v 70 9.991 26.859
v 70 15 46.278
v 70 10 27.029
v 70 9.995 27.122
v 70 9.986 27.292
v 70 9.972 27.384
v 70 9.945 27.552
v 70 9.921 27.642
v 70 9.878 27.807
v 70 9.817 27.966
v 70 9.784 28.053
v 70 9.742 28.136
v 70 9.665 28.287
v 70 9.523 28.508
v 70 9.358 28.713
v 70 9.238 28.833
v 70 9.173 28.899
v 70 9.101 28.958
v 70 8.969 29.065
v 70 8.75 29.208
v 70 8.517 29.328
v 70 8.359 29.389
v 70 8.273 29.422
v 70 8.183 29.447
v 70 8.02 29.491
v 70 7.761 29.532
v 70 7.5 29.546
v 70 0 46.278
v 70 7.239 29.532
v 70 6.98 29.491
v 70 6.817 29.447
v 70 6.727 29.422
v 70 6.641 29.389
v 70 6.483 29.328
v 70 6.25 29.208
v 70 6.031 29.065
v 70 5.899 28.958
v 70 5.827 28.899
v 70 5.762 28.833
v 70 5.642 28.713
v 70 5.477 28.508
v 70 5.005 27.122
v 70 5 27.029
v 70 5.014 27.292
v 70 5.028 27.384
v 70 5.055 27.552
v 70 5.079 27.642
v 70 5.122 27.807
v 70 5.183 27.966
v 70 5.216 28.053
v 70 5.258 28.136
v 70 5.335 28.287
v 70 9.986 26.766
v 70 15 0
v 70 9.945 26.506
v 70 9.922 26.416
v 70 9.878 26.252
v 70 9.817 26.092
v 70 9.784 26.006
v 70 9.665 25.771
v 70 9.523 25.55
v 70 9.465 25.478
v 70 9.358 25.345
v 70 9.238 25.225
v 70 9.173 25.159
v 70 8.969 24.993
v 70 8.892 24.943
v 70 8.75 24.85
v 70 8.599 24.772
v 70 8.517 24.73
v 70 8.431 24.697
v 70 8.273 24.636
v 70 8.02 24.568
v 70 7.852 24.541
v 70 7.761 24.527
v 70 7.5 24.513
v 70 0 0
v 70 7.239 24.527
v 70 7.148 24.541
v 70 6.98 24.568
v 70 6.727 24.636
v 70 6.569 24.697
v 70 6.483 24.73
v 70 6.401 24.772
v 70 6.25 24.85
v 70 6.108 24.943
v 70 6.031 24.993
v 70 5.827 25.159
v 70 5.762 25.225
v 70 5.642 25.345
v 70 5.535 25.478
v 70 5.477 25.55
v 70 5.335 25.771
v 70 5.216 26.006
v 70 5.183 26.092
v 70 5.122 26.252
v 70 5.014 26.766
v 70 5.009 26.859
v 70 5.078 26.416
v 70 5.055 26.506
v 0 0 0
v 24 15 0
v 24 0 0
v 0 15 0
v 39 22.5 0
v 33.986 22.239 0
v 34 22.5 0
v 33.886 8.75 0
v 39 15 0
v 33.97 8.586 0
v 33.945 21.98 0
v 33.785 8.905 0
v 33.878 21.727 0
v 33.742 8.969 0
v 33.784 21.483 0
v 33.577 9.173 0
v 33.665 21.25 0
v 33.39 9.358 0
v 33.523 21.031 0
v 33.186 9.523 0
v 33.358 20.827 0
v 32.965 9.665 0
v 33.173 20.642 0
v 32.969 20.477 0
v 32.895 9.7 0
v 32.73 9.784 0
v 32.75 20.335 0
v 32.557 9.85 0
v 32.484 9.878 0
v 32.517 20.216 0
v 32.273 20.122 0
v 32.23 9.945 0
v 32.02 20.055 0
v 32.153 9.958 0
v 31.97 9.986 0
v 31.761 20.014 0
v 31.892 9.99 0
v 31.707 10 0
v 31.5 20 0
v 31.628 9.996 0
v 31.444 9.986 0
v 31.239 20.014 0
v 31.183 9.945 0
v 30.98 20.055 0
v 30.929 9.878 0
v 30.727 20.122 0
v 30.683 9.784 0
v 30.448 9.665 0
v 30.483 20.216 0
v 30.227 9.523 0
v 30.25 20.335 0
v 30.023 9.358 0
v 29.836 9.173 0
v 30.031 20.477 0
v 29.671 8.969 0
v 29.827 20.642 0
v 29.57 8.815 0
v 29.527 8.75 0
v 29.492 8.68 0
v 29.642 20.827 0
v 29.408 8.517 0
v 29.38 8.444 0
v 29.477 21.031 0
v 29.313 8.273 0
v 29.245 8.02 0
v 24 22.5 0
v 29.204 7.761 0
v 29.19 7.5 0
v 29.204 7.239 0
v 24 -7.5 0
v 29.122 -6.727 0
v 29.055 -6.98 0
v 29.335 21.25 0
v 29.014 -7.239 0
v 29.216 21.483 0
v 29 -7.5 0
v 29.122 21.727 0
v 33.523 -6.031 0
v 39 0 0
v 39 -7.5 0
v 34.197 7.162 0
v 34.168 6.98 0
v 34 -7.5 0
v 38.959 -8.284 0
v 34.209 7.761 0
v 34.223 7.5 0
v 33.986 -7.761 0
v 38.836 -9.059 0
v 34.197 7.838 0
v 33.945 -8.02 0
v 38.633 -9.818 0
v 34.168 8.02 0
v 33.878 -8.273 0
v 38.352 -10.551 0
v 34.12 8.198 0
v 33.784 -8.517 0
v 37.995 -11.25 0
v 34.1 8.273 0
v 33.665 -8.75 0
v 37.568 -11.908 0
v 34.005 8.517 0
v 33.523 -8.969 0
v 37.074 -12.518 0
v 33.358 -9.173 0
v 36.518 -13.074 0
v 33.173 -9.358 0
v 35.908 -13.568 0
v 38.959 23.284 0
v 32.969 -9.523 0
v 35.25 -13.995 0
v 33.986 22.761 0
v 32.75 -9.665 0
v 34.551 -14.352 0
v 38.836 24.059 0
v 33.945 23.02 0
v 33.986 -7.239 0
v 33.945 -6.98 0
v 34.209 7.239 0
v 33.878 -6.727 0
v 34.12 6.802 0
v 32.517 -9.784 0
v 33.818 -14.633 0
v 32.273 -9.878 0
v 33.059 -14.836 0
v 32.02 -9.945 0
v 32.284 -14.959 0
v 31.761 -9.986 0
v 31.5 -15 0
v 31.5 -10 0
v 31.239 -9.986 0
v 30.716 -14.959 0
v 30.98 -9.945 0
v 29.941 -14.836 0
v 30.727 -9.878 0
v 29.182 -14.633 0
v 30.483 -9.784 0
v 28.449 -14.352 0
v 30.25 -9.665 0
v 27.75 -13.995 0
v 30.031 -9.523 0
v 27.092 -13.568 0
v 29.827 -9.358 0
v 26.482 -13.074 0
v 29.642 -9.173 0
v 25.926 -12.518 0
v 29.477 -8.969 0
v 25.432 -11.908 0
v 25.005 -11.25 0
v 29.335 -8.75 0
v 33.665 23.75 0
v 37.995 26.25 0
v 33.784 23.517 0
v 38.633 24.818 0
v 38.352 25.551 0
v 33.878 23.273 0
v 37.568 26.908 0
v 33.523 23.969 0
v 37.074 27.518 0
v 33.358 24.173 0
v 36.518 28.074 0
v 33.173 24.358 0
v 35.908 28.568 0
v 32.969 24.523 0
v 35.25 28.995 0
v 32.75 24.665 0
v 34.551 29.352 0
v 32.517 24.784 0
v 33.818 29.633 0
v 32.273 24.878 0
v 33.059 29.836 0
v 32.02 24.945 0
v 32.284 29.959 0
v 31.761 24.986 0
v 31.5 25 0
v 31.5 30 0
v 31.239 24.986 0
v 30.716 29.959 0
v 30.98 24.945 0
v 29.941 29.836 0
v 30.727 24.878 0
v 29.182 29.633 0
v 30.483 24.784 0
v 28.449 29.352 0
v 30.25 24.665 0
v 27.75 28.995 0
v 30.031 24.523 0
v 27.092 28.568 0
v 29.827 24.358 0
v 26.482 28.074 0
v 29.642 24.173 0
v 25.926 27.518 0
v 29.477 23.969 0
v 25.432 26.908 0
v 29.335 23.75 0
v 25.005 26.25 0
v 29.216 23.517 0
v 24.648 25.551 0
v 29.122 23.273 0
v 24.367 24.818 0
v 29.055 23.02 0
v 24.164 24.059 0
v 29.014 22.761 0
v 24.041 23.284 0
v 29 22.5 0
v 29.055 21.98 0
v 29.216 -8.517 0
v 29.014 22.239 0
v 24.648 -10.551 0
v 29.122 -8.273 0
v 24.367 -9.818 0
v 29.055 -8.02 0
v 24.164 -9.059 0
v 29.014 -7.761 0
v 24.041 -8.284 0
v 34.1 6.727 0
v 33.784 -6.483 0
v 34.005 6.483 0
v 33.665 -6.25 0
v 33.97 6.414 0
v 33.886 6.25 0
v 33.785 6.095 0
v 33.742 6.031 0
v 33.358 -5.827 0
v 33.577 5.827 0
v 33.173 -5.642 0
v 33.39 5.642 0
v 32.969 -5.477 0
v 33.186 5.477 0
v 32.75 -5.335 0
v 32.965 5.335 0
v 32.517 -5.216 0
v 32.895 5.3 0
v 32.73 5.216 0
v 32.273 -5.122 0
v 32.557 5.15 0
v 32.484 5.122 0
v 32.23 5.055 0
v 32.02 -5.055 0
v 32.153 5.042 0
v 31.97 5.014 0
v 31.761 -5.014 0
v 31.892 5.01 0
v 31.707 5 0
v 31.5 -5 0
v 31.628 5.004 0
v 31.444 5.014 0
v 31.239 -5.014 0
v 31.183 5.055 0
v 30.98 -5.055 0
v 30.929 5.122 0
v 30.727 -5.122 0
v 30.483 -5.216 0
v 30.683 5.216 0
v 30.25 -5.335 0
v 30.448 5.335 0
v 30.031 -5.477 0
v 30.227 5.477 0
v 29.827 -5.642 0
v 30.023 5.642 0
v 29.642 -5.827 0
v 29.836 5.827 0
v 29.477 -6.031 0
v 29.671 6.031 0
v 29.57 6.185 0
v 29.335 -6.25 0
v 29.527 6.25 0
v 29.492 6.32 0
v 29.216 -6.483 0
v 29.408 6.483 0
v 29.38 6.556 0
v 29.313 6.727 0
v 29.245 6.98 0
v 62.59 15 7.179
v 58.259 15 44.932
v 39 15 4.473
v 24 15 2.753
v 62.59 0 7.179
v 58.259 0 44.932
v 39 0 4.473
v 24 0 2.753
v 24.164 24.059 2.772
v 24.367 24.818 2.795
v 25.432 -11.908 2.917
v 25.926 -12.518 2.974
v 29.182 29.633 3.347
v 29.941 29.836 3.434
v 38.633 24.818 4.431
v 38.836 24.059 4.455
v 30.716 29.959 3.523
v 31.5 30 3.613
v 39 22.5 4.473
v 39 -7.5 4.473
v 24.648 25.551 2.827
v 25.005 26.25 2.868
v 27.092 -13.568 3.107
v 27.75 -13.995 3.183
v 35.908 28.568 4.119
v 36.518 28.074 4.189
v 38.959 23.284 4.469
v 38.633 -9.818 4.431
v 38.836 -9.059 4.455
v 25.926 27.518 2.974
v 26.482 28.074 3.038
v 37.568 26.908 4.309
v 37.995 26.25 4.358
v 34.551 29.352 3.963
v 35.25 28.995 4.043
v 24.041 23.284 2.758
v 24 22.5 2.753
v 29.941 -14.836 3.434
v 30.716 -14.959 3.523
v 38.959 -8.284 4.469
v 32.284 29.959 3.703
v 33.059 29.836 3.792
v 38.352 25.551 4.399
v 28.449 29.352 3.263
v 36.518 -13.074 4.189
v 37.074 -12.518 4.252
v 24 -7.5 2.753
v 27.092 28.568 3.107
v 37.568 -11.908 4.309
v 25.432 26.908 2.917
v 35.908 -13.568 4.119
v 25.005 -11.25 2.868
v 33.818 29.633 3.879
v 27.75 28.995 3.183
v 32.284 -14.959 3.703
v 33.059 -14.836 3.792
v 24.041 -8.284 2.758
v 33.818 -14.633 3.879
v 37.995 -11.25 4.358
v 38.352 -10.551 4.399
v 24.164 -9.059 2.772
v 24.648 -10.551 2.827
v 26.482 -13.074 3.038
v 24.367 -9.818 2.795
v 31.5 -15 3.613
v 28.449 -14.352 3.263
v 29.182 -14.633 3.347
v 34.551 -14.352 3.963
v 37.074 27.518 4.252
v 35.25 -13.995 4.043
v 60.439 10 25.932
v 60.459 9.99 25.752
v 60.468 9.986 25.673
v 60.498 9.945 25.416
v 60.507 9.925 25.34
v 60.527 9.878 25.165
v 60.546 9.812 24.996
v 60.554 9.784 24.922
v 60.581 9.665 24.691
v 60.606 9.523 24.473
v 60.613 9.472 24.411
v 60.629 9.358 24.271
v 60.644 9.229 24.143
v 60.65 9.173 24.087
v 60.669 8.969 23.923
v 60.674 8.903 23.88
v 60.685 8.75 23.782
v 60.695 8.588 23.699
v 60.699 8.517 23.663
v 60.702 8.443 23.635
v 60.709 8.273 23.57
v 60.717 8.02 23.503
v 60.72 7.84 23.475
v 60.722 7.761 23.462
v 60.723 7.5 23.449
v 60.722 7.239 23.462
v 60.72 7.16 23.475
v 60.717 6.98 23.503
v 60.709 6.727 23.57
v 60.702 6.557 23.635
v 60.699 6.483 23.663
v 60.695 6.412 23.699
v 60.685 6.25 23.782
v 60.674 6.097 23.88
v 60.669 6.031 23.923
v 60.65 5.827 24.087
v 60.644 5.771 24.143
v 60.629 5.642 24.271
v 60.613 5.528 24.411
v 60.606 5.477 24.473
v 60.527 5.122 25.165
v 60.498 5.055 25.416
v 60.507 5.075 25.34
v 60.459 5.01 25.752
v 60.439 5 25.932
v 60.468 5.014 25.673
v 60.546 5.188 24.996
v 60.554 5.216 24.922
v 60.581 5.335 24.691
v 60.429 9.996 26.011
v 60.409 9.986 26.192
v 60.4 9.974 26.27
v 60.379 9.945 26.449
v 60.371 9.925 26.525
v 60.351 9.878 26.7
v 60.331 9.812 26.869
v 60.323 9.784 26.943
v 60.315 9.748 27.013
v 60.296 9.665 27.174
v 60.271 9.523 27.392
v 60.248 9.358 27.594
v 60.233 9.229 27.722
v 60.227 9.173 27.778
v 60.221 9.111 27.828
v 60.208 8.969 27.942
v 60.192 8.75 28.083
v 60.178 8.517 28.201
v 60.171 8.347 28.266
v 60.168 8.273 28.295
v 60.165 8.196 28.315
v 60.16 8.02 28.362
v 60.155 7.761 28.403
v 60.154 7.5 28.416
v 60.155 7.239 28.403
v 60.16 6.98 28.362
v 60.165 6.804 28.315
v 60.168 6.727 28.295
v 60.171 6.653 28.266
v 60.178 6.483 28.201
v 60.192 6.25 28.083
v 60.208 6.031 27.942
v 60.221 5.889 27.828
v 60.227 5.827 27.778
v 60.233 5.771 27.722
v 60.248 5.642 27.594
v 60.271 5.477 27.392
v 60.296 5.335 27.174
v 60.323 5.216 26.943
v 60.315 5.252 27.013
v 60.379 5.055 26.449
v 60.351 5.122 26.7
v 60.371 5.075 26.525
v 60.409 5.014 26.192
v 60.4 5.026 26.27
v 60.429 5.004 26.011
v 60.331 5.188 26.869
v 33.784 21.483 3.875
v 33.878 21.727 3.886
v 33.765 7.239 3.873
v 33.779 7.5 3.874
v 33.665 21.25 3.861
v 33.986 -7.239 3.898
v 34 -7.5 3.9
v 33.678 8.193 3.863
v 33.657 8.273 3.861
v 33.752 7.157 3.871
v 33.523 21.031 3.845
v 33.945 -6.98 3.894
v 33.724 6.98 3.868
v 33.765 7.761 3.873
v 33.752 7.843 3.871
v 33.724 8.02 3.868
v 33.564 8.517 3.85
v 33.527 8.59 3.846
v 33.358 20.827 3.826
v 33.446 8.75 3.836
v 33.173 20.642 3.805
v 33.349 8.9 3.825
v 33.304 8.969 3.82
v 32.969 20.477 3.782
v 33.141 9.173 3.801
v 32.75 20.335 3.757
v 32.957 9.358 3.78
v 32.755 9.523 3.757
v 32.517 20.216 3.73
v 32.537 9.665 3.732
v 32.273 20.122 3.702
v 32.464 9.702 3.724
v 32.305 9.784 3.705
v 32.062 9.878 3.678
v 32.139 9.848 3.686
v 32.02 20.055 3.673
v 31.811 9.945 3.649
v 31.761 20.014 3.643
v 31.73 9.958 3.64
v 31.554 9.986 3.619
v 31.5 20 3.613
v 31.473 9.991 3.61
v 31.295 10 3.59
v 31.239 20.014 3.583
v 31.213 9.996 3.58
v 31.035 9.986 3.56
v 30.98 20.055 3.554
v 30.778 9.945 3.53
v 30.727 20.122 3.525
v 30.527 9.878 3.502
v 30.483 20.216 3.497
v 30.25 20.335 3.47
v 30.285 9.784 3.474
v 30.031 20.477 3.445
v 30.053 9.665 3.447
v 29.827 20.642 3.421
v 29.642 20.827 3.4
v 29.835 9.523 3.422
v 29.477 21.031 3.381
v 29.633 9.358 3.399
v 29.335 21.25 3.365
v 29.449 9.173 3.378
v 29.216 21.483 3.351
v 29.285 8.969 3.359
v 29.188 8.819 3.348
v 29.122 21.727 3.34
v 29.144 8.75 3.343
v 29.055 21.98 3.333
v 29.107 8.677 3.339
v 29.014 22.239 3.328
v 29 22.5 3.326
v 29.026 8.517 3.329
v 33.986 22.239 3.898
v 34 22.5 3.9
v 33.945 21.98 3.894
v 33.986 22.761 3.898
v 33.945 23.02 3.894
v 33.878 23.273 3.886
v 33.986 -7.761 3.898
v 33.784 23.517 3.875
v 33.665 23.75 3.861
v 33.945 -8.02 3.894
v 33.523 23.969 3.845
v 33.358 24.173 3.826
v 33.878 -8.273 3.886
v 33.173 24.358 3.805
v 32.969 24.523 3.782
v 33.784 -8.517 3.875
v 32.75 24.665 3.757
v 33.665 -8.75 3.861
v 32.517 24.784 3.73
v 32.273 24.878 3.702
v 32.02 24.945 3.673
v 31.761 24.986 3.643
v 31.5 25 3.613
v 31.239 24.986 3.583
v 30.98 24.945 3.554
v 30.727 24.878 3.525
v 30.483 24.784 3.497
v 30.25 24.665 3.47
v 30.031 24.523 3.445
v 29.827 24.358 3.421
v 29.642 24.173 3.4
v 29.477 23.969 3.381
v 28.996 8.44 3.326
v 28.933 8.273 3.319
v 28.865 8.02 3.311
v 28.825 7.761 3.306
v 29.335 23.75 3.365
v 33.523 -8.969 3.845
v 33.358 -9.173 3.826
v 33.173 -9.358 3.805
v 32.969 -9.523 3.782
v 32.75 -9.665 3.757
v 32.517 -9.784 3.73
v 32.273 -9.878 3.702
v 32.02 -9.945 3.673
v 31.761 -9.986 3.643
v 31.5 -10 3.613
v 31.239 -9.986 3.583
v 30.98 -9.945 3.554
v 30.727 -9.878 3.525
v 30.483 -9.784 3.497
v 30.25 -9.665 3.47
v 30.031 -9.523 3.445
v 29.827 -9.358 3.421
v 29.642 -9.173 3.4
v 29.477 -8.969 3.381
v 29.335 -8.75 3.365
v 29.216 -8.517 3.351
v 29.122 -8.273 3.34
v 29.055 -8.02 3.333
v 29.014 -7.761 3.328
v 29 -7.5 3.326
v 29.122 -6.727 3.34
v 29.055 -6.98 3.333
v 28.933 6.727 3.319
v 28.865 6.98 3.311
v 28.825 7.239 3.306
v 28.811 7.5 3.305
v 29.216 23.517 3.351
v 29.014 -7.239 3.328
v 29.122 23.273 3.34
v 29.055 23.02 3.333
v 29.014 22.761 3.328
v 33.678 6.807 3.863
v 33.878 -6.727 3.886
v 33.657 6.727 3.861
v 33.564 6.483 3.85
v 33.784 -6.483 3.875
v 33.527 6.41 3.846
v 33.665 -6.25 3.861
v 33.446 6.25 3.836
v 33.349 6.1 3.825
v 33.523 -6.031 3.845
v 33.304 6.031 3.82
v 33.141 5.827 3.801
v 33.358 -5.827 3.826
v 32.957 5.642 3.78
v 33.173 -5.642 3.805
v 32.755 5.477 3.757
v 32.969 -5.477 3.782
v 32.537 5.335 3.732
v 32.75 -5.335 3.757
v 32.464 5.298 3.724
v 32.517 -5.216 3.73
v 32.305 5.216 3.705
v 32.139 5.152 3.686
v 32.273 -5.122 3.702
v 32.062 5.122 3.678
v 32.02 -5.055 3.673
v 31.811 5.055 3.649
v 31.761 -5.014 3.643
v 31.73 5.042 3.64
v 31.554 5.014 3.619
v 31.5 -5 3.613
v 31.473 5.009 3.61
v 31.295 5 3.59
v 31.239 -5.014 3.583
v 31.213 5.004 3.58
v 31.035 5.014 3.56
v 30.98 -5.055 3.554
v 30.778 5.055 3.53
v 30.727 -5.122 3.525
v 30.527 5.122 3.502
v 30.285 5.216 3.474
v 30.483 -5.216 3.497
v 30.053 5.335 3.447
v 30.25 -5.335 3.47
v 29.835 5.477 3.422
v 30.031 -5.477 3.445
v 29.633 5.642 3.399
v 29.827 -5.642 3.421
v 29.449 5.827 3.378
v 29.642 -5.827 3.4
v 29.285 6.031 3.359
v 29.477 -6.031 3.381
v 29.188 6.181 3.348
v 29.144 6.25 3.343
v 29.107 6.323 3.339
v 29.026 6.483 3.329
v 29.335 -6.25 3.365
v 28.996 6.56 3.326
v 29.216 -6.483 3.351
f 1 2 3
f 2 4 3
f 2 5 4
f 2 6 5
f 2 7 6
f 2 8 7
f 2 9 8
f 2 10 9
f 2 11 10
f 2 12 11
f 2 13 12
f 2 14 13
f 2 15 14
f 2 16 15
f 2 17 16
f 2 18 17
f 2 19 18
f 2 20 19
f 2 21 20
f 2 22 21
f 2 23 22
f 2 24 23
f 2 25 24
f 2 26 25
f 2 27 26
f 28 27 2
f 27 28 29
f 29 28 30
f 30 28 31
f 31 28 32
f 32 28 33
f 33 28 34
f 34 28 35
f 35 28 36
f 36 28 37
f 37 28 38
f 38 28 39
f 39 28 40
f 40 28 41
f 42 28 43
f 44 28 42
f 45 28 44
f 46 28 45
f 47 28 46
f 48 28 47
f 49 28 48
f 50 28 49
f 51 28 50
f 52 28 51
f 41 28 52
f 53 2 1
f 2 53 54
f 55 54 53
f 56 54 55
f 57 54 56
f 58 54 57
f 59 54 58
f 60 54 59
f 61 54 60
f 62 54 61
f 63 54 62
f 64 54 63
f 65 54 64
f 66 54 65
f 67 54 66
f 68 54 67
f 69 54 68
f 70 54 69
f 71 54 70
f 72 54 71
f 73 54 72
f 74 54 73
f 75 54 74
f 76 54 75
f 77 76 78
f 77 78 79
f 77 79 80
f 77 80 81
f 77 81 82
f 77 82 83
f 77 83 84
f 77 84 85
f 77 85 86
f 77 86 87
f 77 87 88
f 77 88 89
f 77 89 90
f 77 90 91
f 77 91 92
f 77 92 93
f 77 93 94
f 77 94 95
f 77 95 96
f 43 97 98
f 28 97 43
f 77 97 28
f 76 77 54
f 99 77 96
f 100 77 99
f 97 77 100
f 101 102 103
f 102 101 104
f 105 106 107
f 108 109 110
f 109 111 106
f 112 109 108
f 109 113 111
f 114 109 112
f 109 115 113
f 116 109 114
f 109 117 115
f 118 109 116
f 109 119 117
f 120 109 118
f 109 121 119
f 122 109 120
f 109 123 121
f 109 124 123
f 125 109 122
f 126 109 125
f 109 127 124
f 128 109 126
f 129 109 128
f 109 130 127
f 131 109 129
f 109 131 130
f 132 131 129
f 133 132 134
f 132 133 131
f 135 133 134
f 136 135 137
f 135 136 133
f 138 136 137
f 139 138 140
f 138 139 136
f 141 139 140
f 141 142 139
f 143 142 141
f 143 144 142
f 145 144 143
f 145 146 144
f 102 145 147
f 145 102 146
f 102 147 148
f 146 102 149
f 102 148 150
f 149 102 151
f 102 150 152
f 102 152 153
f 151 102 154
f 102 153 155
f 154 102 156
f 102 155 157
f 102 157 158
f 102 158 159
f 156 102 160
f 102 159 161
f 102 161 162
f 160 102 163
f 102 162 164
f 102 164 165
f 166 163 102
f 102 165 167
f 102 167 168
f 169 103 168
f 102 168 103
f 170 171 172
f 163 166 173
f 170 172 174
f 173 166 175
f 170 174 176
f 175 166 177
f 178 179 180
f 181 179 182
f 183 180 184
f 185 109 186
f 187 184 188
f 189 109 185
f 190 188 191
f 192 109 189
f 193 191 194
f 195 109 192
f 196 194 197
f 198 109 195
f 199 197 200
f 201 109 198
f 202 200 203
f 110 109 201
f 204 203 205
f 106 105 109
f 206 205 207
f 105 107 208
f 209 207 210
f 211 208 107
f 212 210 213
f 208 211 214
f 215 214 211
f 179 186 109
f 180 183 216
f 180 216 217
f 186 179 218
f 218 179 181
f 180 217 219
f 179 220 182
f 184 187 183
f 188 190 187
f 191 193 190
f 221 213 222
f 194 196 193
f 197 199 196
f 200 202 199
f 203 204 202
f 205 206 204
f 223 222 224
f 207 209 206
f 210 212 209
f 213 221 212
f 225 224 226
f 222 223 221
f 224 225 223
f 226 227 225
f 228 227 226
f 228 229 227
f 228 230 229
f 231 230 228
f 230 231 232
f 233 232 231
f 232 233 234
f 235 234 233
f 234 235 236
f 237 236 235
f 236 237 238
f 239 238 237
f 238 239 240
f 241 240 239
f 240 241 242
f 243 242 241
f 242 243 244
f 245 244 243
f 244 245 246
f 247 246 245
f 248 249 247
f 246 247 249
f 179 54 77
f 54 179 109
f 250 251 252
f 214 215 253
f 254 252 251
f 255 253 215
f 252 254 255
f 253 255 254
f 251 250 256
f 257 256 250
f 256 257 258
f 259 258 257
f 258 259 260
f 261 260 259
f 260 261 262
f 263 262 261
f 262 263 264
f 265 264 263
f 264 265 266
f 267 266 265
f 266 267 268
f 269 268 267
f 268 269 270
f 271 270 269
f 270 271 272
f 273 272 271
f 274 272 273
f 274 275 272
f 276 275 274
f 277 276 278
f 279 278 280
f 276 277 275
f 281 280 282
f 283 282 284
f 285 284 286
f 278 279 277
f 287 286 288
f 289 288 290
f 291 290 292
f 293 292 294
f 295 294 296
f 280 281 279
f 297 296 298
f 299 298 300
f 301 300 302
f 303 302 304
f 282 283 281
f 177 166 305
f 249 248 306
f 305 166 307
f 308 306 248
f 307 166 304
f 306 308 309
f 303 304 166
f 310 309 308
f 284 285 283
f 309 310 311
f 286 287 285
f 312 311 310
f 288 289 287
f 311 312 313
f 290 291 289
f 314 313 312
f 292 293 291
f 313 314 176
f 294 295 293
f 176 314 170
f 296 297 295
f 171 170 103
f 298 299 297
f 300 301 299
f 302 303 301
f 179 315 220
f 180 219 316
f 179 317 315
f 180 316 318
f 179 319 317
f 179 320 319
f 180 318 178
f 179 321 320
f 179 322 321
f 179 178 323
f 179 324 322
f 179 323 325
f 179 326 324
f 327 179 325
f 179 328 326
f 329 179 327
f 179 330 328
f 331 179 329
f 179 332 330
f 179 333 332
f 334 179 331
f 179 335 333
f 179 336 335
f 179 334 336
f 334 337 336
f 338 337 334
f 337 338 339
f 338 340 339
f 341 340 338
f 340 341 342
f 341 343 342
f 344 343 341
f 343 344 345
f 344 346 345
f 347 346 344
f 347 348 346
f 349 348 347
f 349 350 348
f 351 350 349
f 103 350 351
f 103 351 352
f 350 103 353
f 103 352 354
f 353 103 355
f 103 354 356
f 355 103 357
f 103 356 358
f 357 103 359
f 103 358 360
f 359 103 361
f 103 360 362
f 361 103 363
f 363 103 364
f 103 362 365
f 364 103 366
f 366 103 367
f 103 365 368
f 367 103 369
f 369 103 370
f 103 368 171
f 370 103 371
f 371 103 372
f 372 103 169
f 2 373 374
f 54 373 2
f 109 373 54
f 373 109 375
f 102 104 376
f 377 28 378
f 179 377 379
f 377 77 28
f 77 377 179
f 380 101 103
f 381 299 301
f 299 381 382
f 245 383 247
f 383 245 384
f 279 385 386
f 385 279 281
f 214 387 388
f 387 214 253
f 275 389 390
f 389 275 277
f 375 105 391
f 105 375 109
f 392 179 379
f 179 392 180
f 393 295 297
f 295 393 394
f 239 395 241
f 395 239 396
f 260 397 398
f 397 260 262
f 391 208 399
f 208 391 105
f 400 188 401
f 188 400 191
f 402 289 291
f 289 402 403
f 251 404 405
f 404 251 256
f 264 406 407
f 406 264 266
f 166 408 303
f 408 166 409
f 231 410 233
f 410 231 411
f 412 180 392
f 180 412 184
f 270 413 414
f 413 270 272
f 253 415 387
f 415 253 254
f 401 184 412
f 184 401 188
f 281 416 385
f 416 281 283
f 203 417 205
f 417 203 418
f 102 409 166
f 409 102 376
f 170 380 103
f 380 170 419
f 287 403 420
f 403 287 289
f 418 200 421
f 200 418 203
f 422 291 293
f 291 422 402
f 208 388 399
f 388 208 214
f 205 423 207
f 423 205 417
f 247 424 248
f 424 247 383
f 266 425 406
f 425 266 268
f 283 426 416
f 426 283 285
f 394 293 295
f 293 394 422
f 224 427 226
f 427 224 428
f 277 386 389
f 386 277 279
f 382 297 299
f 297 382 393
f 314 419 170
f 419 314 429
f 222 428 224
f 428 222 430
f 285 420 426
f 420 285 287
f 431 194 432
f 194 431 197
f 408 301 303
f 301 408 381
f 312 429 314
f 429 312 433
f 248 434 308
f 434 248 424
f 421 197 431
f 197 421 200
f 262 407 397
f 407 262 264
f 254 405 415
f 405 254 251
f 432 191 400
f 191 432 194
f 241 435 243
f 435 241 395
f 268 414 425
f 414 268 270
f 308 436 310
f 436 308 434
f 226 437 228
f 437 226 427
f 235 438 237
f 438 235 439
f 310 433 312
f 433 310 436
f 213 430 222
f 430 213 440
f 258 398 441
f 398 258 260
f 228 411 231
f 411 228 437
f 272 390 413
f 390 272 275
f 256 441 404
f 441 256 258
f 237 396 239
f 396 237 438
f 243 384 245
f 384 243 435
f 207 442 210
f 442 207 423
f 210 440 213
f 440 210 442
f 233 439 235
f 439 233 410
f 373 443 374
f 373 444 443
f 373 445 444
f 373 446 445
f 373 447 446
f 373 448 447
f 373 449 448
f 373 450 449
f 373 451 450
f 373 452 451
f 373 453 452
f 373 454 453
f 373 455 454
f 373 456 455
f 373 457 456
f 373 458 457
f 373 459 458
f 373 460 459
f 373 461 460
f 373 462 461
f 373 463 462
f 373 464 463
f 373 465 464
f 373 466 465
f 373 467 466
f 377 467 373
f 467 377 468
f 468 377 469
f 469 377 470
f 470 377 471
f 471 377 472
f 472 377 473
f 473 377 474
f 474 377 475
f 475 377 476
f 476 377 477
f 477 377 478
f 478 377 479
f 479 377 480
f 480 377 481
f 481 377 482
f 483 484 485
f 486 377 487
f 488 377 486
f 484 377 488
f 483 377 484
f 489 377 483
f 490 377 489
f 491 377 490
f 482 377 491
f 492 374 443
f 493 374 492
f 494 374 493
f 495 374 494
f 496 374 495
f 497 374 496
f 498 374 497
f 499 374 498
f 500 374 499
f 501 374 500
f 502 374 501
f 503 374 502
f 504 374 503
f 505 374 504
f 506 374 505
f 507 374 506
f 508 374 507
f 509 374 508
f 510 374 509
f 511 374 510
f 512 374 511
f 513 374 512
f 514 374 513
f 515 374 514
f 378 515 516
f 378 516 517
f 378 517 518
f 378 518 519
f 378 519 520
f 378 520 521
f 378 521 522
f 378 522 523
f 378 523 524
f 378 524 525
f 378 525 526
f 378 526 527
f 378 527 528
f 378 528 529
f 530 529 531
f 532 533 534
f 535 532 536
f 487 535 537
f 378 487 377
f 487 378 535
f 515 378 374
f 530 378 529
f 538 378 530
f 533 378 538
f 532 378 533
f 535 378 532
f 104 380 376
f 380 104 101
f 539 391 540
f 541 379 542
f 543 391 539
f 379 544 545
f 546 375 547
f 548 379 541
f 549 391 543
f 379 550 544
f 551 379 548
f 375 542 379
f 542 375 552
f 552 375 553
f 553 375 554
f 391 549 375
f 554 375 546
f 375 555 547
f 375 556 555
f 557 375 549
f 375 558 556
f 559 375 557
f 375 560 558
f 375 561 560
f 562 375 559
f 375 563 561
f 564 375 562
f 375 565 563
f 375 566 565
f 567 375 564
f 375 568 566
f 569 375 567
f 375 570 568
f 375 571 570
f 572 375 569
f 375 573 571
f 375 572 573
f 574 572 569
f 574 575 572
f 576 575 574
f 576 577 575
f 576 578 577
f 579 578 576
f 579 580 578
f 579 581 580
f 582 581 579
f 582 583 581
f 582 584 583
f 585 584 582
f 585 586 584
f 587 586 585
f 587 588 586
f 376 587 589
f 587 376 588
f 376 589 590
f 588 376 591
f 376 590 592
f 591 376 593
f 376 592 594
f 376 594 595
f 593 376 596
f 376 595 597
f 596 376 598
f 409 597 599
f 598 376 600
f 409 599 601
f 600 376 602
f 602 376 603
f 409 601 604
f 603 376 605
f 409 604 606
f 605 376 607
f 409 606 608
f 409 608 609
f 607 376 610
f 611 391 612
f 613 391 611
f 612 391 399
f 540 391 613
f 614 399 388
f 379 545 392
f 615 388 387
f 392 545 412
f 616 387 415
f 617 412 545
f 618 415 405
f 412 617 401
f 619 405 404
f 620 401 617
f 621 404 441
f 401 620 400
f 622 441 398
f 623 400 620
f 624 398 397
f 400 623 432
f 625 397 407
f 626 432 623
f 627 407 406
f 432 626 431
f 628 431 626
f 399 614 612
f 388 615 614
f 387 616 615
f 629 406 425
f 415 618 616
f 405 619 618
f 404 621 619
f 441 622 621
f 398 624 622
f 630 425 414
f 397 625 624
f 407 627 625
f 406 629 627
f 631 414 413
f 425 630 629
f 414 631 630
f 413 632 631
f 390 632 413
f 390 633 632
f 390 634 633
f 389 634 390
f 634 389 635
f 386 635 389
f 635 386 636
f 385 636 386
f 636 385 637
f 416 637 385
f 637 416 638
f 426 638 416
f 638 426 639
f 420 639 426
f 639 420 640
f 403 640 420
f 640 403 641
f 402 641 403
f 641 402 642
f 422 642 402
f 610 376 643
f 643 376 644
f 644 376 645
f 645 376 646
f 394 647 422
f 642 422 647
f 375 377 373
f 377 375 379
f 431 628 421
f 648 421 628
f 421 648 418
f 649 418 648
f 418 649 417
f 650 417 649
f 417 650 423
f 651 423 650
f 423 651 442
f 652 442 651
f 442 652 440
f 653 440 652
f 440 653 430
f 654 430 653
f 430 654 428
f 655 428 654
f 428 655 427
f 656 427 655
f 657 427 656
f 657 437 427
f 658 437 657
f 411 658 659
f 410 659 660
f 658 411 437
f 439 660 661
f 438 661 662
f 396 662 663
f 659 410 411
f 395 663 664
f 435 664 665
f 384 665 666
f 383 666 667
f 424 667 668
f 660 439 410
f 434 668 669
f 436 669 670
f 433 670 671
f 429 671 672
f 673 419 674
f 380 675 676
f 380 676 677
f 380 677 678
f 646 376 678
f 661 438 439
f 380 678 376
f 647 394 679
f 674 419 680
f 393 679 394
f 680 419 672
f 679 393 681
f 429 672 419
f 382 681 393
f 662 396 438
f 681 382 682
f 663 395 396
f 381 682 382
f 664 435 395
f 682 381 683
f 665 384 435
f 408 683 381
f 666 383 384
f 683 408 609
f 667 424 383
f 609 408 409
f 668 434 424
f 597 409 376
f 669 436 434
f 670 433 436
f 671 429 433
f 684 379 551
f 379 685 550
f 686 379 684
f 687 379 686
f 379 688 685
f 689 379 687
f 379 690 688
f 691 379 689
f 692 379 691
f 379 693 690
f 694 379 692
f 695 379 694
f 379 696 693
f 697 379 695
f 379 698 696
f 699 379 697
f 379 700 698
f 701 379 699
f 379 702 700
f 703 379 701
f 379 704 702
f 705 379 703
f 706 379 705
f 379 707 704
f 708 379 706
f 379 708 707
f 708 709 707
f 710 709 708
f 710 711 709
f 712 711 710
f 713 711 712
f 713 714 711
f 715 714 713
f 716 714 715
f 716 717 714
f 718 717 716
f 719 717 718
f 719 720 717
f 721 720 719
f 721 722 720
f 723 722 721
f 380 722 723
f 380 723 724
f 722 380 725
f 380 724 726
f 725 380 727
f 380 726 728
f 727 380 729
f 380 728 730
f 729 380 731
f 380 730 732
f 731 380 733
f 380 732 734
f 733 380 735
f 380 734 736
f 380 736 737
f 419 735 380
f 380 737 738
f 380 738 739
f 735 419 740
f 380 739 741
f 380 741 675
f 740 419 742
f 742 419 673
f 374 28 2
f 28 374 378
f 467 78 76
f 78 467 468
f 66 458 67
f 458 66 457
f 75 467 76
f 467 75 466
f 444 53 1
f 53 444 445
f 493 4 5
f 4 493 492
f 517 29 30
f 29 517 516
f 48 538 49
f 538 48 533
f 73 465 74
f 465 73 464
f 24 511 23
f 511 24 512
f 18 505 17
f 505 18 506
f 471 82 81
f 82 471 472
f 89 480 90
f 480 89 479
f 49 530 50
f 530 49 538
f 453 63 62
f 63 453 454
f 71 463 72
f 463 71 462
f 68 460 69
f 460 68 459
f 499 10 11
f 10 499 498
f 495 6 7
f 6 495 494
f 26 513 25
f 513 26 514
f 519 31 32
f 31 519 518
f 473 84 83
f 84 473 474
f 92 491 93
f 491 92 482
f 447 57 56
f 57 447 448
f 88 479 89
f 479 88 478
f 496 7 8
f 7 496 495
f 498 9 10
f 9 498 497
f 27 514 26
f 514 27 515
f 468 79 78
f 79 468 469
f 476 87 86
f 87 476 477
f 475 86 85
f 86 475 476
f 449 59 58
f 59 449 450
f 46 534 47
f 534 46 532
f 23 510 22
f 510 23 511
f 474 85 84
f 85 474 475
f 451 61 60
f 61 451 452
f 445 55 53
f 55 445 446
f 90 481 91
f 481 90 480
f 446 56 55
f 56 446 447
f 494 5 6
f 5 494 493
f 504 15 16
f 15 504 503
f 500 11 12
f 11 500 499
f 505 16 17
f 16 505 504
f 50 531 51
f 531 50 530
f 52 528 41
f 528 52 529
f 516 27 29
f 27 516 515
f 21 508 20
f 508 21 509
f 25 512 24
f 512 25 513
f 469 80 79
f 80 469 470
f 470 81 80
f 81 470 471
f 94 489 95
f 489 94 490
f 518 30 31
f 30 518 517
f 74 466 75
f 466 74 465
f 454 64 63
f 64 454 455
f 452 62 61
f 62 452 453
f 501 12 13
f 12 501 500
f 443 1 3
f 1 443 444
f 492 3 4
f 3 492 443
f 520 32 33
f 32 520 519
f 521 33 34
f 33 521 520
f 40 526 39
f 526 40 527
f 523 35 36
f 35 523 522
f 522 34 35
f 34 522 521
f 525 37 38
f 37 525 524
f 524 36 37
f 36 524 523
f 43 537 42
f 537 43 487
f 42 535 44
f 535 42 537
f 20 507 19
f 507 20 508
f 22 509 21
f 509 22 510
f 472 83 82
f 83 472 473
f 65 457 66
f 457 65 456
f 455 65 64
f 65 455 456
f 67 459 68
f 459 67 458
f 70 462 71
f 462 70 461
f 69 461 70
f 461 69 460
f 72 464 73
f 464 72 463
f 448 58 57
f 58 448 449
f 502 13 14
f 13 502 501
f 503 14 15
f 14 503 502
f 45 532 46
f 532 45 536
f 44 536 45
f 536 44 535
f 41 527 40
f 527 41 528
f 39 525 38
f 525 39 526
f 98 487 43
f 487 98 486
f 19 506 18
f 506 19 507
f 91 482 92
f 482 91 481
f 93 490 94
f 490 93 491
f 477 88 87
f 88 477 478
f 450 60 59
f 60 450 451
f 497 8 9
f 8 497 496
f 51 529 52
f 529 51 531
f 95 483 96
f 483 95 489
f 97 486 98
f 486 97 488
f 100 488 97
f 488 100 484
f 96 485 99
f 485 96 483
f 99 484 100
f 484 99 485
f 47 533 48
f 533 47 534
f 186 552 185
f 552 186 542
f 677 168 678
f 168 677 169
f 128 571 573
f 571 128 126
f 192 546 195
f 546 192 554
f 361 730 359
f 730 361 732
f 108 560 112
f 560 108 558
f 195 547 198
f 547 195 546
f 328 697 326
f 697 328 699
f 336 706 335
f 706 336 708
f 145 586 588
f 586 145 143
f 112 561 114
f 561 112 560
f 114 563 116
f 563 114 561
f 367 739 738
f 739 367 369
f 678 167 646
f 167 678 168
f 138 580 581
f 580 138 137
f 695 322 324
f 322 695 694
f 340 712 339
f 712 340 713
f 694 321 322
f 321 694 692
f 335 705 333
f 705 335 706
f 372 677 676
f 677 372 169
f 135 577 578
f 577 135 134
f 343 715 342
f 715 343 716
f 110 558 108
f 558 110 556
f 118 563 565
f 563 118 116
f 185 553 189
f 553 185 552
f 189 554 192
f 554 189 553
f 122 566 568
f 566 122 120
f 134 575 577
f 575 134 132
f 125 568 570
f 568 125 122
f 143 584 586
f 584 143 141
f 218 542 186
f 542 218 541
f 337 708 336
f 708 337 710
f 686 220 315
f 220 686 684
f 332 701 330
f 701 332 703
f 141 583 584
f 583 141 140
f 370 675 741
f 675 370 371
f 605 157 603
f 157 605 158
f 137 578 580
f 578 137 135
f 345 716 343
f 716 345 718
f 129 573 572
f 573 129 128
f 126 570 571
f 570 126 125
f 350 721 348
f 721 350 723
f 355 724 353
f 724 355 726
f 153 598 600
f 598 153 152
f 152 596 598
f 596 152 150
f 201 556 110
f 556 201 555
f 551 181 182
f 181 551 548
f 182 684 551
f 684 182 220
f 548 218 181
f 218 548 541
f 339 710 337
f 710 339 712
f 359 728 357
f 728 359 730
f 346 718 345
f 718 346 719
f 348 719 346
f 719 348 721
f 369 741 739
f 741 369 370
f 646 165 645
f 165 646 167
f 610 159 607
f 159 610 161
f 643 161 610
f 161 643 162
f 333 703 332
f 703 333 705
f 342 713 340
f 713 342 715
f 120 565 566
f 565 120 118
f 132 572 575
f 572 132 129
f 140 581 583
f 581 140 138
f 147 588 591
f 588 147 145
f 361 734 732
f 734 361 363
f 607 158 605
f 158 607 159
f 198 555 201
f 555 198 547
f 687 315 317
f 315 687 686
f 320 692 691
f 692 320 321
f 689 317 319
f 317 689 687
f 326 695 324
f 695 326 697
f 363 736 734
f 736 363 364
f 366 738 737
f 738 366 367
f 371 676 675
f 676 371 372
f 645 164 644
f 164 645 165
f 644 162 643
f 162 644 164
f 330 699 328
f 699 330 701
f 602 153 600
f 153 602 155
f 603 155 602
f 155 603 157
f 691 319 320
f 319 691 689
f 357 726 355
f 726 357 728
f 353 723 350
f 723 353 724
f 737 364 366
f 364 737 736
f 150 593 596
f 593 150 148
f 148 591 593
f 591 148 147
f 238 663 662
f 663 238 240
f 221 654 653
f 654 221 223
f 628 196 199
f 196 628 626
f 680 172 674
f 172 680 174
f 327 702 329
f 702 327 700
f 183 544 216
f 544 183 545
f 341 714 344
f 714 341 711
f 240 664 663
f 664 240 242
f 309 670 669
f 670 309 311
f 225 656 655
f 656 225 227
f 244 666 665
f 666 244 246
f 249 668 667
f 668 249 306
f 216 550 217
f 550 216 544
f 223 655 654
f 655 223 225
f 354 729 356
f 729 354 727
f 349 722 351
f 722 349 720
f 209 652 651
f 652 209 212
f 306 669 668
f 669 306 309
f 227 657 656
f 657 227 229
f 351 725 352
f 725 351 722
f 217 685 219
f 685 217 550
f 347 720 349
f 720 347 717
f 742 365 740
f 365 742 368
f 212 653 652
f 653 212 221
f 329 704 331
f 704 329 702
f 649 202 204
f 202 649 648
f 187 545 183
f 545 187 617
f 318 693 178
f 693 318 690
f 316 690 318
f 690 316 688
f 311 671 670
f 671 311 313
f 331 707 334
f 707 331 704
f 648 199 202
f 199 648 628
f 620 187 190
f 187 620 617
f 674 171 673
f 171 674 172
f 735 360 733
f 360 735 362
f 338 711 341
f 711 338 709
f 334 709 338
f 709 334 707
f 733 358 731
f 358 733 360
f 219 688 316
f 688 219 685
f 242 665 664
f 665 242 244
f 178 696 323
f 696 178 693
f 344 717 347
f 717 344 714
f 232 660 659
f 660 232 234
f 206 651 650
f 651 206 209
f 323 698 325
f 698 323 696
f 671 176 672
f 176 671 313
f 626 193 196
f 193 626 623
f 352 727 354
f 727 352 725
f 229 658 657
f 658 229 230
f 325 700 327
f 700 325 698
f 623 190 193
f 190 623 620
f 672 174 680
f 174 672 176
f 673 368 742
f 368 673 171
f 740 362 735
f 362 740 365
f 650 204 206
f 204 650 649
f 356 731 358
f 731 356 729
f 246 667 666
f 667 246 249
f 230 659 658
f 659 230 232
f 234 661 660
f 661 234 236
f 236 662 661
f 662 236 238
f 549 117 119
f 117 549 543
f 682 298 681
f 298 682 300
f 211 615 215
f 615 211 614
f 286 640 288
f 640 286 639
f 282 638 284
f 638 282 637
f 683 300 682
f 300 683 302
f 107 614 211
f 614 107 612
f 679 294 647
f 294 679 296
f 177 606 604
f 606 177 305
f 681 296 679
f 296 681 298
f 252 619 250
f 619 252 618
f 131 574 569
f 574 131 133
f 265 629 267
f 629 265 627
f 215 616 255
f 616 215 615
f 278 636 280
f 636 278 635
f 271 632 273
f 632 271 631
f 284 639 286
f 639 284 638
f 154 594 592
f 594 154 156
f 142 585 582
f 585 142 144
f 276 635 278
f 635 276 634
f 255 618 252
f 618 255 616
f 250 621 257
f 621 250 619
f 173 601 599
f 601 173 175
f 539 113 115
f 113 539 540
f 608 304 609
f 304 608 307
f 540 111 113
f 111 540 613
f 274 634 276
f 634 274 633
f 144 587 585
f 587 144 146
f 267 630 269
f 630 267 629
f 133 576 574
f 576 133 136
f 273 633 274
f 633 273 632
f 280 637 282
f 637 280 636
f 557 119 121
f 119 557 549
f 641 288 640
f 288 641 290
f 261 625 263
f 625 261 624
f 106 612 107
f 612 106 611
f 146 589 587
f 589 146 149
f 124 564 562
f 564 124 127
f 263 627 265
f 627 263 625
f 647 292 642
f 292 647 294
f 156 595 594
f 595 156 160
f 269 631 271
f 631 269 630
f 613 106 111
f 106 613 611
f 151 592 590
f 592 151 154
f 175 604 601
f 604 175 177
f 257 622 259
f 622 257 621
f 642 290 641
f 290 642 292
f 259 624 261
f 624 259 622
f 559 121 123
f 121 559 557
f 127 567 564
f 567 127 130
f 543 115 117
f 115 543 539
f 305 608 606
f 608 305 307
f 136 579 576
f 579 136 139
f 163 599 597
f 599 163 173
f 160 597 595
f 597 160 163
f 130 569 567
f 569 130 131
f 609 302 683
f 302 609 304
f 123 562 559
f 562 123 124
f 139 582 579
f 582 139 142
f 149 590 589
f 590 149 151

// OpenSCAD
theta = 6.54339;

timber_construct_w = 38;
timber_construct_h = 63;
base_sheet_t = 18;
d_hole = 5;

$fn=60;

module fullSize()
{
difference()
{
    cube([timber_construct_h+base_sheet_t,timber_construct_h,timber_construct_h]);
    rotate([0, -theta,0]) translate([-timber_construct_h,-timber_construct_h,0]) cube([timber_construct_h*2,timber_construct_h*3,timber_construct_h*2]);
    rotate([0, -theta,0])   translate([-timber_construct_h,-timber_construct_h,base_sheet_t]) cube([timber_construct_h*3,timber_construct_h*3,timber_construct_h]);
    translate([0,timber_construct_h*1/4,base_sheet_t/2]) rotate([0, 90-theta,0])  cylinder(d=d_hole,h=200);
    translate([0,timber_construct_h*3/4,base_sheet_t/2]) rotate([0, 90-theta,0])  cylinder(d=d_hole,h=200);
    translate([timber_construct_h/2,timber_construct_h*1/4,-timber_construct_h]) rotate([0, 0,0])  cylinder(d=d_hole,h=200);
    translate([timber_construct_h/2,timber_construct_h*3/4,-timber_construct_h]) rotate([0, 0,0])  cylinder(d=d_hole,h=200);

}
}

module slim()
{
difference()
{
    union()
    {
        cube([timber_construct_h+d_hole+2,d_hole*3,timber_construct_h]);
        hull()
        {
            translate([0,-d_hole*3,0]) translate([timber_construct_h/2,d_hole*1.5,0]) rotate([0, 0,0])  cylinder(d=d_hole*3,h=timber_construct_h);
            translate([0,d_hole*3,0]) translate([timber_construct_h/2,d_hole*1.5,0]) rotate([0, 0,0])  cylinder(d=d_hole*3,h=timber_construct_h);
        }
    }
    rotate([0, -theta,0]) translate([-timber_construct_h,-timber_construct_h,0]) cube([timber_construct_h*2,timber_construct_h*3,timber_construct_h*2]);
    rotate([0, -theta,0])   translate([-timber_construct_h,-timber_construct_h,timber_construct_w]) cube([timber_construct_h*3,timber_construct_h*3,timber_construct_h]);
    translate([0,d_hole*1.5,timber_construct_w/2]) rotate([0, 90-theta,0])  cylinder(d=d_hole,h=200);
    rotate([0, -theta,0]) translate([timber_construct_h/2,d_hole*1.5,-timber_construct_h]) rotate([0, 0,0])  cylinder(d=d_hole,h=200);
    translate([timber_construct_h/2,d_hole*1.5-d_hole*3,-timber_construct_h]) rotate([0, 0,0])  cylinder(d=d_hole,h=200);
    translate([timber_construct_h/2,d_hole*1.5+d_hole*3,-timber_construct_h]) rotate([0, 0,0])  cylinder(d=d_hole,h=200);
    
}
}

slim();
